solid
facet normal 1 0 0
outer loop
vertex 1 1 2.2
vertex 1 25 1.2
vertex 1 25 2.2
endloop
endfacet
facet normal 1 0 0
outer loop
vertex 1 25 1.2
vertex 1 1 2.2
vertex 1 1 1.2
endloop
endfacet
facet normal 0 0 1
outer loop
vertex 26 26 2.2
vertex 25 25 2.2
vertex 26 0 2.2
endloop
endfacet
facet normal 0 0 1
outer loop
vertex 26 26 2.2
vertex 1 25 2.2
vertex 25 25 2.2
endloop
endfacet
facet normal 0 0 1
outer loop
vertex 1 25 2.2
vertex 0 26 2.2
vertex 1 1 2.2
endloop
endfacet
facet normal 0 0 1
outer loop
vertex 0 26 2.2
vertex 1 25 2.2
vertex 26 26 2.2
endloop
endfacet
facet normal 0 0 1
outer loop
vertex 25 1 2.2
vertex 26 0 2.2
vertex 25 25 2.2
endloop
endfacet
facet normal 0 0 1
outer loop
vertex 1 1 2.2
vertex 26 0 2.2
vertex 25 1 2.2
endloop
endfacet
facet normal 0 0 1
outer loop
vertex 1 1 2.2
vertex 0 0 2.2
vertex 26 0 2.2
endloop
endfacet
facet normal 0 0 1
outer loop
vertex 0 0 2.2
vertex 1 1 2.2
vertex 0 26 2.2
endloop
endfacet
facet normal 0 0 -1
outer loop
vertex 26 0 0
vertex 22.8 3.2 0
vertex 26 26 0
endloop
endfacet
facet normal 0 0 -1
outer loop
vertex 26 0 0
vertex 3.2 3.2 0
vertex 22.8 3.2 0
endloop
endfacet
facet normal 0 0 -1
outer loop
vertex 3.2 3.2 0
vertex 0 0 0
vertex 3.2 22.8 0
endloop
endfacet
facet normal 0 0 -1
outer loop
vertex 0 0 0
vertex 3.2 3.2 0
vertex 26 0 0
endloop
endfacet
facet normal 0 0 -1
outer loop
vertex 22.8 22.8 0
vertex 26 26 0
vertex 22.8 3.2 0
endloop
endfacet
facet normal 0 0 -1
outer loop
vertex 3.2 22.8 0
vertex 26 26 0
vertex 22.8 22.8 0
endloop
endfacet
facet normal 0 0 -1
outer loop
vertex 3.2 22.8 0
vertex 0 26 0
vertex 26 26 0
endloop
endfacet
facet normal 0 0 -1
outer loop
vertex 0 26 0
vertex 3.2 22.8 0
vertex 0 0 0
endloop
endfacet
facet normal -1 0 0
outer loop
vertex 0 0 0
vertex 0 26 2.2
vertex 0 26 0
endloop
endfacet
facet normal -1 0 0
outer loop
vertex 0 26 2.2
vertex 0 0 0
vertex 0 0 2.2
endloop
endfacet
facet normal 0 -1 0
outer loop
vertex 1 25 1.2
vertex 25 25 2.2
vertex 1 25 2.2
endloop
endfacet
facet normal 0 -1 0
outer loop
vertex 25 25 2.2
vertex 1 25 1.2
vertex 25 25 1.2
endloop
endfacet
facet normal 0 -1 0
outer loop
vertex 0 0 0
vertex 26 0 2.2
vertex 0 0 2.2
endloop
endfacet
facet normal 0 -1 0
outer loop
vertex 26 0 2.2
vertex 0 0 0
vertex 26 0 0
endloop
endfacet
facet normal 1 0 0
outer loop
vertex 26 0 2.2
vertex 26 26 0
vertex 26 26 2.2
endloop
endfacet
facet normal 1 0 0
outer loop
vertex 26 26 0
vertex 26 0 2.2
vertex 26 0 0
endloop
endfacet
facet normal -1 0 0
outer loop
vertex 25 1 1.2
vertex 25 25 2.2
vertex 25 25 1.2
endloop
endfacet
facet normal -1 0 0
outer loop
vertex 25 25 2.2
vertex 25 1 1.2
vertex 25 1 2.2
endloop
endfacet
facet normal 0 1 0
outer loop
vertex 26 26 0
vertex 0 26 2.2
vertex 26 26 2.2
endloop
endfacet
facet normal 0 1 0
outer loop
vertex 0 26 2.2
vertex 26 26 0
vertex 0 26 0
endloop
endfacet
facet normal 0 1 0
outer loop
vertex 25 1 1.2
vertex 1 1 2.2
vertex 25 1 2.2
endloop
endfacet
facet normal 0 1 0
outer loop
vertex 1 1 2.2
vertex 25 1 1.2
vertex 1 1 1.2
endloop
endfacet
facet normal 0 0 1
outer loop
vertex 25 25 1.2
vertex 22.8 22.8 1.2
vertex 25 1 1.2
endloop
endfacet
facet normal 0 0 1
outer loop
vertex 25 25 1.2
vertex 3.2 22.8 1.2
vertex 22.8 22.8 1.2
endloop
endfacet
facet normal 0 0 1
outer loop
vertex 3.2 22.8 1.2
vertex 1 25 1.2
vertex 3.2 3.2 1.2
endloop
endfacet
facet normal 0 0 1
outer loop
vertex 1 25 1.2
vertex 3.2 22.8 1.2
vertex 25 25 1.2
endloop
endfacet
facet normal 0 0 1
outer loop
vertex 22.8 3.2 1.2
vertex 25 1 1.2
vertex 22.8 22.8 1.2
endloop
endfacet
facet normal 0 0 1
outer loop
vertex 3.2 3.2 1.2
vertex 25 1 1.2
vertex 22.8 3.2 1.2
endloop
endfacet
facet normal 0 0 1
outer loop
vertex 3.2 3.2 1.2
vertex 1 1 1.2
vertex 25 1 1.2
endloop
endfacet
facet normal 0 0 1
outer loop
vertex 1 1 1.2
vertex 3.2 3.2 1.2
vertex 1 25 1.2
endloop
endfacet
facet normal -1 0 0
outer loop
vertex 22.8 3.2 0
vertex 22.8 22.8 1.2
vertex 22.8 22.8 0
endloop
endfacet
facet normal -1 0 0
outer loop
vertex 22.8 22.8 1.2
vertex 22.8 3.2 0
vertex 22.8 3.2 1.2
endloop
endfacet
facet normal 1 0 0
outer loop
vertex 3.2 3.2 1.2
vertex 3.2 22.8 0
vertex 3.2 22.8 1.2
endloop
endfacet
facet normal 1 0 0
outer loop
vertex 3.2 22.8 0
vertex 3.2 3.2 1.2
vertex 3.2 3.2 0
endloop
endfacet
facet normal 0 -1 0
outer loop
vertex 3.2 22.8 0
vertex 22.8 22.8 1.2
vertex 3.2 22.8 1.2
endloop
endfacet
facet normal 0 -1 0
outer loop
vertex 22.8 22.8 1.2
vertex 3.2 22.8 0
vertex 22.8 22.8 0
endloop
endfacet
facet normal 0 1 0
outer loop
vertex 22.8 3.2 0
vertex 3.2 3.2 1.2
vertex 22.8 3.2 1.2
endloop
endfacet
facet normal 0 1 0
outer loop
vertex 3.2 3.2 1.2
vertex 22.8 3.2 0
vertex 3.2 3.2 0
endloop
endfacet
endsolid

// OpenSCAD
$fn = 100; // Разрешение поверхности.

module frame(h) {
	cube([1, 25, h]);
	translate([25, 0, 0]) { cube([1, 26, h]); }
	cube([25, 1, h]);
	translate([0, 25, 0]) { cube([26, 1, h]); }
}

module base() {
	union() {
		cube([26, 26, 1.2]);
		frame(2.2);
	}
}

// Деталь полностью:
difference() {
	base();
	translate([3.2, 3.2, -1]) { cube([19.6, 19.6, 4]); }
}
